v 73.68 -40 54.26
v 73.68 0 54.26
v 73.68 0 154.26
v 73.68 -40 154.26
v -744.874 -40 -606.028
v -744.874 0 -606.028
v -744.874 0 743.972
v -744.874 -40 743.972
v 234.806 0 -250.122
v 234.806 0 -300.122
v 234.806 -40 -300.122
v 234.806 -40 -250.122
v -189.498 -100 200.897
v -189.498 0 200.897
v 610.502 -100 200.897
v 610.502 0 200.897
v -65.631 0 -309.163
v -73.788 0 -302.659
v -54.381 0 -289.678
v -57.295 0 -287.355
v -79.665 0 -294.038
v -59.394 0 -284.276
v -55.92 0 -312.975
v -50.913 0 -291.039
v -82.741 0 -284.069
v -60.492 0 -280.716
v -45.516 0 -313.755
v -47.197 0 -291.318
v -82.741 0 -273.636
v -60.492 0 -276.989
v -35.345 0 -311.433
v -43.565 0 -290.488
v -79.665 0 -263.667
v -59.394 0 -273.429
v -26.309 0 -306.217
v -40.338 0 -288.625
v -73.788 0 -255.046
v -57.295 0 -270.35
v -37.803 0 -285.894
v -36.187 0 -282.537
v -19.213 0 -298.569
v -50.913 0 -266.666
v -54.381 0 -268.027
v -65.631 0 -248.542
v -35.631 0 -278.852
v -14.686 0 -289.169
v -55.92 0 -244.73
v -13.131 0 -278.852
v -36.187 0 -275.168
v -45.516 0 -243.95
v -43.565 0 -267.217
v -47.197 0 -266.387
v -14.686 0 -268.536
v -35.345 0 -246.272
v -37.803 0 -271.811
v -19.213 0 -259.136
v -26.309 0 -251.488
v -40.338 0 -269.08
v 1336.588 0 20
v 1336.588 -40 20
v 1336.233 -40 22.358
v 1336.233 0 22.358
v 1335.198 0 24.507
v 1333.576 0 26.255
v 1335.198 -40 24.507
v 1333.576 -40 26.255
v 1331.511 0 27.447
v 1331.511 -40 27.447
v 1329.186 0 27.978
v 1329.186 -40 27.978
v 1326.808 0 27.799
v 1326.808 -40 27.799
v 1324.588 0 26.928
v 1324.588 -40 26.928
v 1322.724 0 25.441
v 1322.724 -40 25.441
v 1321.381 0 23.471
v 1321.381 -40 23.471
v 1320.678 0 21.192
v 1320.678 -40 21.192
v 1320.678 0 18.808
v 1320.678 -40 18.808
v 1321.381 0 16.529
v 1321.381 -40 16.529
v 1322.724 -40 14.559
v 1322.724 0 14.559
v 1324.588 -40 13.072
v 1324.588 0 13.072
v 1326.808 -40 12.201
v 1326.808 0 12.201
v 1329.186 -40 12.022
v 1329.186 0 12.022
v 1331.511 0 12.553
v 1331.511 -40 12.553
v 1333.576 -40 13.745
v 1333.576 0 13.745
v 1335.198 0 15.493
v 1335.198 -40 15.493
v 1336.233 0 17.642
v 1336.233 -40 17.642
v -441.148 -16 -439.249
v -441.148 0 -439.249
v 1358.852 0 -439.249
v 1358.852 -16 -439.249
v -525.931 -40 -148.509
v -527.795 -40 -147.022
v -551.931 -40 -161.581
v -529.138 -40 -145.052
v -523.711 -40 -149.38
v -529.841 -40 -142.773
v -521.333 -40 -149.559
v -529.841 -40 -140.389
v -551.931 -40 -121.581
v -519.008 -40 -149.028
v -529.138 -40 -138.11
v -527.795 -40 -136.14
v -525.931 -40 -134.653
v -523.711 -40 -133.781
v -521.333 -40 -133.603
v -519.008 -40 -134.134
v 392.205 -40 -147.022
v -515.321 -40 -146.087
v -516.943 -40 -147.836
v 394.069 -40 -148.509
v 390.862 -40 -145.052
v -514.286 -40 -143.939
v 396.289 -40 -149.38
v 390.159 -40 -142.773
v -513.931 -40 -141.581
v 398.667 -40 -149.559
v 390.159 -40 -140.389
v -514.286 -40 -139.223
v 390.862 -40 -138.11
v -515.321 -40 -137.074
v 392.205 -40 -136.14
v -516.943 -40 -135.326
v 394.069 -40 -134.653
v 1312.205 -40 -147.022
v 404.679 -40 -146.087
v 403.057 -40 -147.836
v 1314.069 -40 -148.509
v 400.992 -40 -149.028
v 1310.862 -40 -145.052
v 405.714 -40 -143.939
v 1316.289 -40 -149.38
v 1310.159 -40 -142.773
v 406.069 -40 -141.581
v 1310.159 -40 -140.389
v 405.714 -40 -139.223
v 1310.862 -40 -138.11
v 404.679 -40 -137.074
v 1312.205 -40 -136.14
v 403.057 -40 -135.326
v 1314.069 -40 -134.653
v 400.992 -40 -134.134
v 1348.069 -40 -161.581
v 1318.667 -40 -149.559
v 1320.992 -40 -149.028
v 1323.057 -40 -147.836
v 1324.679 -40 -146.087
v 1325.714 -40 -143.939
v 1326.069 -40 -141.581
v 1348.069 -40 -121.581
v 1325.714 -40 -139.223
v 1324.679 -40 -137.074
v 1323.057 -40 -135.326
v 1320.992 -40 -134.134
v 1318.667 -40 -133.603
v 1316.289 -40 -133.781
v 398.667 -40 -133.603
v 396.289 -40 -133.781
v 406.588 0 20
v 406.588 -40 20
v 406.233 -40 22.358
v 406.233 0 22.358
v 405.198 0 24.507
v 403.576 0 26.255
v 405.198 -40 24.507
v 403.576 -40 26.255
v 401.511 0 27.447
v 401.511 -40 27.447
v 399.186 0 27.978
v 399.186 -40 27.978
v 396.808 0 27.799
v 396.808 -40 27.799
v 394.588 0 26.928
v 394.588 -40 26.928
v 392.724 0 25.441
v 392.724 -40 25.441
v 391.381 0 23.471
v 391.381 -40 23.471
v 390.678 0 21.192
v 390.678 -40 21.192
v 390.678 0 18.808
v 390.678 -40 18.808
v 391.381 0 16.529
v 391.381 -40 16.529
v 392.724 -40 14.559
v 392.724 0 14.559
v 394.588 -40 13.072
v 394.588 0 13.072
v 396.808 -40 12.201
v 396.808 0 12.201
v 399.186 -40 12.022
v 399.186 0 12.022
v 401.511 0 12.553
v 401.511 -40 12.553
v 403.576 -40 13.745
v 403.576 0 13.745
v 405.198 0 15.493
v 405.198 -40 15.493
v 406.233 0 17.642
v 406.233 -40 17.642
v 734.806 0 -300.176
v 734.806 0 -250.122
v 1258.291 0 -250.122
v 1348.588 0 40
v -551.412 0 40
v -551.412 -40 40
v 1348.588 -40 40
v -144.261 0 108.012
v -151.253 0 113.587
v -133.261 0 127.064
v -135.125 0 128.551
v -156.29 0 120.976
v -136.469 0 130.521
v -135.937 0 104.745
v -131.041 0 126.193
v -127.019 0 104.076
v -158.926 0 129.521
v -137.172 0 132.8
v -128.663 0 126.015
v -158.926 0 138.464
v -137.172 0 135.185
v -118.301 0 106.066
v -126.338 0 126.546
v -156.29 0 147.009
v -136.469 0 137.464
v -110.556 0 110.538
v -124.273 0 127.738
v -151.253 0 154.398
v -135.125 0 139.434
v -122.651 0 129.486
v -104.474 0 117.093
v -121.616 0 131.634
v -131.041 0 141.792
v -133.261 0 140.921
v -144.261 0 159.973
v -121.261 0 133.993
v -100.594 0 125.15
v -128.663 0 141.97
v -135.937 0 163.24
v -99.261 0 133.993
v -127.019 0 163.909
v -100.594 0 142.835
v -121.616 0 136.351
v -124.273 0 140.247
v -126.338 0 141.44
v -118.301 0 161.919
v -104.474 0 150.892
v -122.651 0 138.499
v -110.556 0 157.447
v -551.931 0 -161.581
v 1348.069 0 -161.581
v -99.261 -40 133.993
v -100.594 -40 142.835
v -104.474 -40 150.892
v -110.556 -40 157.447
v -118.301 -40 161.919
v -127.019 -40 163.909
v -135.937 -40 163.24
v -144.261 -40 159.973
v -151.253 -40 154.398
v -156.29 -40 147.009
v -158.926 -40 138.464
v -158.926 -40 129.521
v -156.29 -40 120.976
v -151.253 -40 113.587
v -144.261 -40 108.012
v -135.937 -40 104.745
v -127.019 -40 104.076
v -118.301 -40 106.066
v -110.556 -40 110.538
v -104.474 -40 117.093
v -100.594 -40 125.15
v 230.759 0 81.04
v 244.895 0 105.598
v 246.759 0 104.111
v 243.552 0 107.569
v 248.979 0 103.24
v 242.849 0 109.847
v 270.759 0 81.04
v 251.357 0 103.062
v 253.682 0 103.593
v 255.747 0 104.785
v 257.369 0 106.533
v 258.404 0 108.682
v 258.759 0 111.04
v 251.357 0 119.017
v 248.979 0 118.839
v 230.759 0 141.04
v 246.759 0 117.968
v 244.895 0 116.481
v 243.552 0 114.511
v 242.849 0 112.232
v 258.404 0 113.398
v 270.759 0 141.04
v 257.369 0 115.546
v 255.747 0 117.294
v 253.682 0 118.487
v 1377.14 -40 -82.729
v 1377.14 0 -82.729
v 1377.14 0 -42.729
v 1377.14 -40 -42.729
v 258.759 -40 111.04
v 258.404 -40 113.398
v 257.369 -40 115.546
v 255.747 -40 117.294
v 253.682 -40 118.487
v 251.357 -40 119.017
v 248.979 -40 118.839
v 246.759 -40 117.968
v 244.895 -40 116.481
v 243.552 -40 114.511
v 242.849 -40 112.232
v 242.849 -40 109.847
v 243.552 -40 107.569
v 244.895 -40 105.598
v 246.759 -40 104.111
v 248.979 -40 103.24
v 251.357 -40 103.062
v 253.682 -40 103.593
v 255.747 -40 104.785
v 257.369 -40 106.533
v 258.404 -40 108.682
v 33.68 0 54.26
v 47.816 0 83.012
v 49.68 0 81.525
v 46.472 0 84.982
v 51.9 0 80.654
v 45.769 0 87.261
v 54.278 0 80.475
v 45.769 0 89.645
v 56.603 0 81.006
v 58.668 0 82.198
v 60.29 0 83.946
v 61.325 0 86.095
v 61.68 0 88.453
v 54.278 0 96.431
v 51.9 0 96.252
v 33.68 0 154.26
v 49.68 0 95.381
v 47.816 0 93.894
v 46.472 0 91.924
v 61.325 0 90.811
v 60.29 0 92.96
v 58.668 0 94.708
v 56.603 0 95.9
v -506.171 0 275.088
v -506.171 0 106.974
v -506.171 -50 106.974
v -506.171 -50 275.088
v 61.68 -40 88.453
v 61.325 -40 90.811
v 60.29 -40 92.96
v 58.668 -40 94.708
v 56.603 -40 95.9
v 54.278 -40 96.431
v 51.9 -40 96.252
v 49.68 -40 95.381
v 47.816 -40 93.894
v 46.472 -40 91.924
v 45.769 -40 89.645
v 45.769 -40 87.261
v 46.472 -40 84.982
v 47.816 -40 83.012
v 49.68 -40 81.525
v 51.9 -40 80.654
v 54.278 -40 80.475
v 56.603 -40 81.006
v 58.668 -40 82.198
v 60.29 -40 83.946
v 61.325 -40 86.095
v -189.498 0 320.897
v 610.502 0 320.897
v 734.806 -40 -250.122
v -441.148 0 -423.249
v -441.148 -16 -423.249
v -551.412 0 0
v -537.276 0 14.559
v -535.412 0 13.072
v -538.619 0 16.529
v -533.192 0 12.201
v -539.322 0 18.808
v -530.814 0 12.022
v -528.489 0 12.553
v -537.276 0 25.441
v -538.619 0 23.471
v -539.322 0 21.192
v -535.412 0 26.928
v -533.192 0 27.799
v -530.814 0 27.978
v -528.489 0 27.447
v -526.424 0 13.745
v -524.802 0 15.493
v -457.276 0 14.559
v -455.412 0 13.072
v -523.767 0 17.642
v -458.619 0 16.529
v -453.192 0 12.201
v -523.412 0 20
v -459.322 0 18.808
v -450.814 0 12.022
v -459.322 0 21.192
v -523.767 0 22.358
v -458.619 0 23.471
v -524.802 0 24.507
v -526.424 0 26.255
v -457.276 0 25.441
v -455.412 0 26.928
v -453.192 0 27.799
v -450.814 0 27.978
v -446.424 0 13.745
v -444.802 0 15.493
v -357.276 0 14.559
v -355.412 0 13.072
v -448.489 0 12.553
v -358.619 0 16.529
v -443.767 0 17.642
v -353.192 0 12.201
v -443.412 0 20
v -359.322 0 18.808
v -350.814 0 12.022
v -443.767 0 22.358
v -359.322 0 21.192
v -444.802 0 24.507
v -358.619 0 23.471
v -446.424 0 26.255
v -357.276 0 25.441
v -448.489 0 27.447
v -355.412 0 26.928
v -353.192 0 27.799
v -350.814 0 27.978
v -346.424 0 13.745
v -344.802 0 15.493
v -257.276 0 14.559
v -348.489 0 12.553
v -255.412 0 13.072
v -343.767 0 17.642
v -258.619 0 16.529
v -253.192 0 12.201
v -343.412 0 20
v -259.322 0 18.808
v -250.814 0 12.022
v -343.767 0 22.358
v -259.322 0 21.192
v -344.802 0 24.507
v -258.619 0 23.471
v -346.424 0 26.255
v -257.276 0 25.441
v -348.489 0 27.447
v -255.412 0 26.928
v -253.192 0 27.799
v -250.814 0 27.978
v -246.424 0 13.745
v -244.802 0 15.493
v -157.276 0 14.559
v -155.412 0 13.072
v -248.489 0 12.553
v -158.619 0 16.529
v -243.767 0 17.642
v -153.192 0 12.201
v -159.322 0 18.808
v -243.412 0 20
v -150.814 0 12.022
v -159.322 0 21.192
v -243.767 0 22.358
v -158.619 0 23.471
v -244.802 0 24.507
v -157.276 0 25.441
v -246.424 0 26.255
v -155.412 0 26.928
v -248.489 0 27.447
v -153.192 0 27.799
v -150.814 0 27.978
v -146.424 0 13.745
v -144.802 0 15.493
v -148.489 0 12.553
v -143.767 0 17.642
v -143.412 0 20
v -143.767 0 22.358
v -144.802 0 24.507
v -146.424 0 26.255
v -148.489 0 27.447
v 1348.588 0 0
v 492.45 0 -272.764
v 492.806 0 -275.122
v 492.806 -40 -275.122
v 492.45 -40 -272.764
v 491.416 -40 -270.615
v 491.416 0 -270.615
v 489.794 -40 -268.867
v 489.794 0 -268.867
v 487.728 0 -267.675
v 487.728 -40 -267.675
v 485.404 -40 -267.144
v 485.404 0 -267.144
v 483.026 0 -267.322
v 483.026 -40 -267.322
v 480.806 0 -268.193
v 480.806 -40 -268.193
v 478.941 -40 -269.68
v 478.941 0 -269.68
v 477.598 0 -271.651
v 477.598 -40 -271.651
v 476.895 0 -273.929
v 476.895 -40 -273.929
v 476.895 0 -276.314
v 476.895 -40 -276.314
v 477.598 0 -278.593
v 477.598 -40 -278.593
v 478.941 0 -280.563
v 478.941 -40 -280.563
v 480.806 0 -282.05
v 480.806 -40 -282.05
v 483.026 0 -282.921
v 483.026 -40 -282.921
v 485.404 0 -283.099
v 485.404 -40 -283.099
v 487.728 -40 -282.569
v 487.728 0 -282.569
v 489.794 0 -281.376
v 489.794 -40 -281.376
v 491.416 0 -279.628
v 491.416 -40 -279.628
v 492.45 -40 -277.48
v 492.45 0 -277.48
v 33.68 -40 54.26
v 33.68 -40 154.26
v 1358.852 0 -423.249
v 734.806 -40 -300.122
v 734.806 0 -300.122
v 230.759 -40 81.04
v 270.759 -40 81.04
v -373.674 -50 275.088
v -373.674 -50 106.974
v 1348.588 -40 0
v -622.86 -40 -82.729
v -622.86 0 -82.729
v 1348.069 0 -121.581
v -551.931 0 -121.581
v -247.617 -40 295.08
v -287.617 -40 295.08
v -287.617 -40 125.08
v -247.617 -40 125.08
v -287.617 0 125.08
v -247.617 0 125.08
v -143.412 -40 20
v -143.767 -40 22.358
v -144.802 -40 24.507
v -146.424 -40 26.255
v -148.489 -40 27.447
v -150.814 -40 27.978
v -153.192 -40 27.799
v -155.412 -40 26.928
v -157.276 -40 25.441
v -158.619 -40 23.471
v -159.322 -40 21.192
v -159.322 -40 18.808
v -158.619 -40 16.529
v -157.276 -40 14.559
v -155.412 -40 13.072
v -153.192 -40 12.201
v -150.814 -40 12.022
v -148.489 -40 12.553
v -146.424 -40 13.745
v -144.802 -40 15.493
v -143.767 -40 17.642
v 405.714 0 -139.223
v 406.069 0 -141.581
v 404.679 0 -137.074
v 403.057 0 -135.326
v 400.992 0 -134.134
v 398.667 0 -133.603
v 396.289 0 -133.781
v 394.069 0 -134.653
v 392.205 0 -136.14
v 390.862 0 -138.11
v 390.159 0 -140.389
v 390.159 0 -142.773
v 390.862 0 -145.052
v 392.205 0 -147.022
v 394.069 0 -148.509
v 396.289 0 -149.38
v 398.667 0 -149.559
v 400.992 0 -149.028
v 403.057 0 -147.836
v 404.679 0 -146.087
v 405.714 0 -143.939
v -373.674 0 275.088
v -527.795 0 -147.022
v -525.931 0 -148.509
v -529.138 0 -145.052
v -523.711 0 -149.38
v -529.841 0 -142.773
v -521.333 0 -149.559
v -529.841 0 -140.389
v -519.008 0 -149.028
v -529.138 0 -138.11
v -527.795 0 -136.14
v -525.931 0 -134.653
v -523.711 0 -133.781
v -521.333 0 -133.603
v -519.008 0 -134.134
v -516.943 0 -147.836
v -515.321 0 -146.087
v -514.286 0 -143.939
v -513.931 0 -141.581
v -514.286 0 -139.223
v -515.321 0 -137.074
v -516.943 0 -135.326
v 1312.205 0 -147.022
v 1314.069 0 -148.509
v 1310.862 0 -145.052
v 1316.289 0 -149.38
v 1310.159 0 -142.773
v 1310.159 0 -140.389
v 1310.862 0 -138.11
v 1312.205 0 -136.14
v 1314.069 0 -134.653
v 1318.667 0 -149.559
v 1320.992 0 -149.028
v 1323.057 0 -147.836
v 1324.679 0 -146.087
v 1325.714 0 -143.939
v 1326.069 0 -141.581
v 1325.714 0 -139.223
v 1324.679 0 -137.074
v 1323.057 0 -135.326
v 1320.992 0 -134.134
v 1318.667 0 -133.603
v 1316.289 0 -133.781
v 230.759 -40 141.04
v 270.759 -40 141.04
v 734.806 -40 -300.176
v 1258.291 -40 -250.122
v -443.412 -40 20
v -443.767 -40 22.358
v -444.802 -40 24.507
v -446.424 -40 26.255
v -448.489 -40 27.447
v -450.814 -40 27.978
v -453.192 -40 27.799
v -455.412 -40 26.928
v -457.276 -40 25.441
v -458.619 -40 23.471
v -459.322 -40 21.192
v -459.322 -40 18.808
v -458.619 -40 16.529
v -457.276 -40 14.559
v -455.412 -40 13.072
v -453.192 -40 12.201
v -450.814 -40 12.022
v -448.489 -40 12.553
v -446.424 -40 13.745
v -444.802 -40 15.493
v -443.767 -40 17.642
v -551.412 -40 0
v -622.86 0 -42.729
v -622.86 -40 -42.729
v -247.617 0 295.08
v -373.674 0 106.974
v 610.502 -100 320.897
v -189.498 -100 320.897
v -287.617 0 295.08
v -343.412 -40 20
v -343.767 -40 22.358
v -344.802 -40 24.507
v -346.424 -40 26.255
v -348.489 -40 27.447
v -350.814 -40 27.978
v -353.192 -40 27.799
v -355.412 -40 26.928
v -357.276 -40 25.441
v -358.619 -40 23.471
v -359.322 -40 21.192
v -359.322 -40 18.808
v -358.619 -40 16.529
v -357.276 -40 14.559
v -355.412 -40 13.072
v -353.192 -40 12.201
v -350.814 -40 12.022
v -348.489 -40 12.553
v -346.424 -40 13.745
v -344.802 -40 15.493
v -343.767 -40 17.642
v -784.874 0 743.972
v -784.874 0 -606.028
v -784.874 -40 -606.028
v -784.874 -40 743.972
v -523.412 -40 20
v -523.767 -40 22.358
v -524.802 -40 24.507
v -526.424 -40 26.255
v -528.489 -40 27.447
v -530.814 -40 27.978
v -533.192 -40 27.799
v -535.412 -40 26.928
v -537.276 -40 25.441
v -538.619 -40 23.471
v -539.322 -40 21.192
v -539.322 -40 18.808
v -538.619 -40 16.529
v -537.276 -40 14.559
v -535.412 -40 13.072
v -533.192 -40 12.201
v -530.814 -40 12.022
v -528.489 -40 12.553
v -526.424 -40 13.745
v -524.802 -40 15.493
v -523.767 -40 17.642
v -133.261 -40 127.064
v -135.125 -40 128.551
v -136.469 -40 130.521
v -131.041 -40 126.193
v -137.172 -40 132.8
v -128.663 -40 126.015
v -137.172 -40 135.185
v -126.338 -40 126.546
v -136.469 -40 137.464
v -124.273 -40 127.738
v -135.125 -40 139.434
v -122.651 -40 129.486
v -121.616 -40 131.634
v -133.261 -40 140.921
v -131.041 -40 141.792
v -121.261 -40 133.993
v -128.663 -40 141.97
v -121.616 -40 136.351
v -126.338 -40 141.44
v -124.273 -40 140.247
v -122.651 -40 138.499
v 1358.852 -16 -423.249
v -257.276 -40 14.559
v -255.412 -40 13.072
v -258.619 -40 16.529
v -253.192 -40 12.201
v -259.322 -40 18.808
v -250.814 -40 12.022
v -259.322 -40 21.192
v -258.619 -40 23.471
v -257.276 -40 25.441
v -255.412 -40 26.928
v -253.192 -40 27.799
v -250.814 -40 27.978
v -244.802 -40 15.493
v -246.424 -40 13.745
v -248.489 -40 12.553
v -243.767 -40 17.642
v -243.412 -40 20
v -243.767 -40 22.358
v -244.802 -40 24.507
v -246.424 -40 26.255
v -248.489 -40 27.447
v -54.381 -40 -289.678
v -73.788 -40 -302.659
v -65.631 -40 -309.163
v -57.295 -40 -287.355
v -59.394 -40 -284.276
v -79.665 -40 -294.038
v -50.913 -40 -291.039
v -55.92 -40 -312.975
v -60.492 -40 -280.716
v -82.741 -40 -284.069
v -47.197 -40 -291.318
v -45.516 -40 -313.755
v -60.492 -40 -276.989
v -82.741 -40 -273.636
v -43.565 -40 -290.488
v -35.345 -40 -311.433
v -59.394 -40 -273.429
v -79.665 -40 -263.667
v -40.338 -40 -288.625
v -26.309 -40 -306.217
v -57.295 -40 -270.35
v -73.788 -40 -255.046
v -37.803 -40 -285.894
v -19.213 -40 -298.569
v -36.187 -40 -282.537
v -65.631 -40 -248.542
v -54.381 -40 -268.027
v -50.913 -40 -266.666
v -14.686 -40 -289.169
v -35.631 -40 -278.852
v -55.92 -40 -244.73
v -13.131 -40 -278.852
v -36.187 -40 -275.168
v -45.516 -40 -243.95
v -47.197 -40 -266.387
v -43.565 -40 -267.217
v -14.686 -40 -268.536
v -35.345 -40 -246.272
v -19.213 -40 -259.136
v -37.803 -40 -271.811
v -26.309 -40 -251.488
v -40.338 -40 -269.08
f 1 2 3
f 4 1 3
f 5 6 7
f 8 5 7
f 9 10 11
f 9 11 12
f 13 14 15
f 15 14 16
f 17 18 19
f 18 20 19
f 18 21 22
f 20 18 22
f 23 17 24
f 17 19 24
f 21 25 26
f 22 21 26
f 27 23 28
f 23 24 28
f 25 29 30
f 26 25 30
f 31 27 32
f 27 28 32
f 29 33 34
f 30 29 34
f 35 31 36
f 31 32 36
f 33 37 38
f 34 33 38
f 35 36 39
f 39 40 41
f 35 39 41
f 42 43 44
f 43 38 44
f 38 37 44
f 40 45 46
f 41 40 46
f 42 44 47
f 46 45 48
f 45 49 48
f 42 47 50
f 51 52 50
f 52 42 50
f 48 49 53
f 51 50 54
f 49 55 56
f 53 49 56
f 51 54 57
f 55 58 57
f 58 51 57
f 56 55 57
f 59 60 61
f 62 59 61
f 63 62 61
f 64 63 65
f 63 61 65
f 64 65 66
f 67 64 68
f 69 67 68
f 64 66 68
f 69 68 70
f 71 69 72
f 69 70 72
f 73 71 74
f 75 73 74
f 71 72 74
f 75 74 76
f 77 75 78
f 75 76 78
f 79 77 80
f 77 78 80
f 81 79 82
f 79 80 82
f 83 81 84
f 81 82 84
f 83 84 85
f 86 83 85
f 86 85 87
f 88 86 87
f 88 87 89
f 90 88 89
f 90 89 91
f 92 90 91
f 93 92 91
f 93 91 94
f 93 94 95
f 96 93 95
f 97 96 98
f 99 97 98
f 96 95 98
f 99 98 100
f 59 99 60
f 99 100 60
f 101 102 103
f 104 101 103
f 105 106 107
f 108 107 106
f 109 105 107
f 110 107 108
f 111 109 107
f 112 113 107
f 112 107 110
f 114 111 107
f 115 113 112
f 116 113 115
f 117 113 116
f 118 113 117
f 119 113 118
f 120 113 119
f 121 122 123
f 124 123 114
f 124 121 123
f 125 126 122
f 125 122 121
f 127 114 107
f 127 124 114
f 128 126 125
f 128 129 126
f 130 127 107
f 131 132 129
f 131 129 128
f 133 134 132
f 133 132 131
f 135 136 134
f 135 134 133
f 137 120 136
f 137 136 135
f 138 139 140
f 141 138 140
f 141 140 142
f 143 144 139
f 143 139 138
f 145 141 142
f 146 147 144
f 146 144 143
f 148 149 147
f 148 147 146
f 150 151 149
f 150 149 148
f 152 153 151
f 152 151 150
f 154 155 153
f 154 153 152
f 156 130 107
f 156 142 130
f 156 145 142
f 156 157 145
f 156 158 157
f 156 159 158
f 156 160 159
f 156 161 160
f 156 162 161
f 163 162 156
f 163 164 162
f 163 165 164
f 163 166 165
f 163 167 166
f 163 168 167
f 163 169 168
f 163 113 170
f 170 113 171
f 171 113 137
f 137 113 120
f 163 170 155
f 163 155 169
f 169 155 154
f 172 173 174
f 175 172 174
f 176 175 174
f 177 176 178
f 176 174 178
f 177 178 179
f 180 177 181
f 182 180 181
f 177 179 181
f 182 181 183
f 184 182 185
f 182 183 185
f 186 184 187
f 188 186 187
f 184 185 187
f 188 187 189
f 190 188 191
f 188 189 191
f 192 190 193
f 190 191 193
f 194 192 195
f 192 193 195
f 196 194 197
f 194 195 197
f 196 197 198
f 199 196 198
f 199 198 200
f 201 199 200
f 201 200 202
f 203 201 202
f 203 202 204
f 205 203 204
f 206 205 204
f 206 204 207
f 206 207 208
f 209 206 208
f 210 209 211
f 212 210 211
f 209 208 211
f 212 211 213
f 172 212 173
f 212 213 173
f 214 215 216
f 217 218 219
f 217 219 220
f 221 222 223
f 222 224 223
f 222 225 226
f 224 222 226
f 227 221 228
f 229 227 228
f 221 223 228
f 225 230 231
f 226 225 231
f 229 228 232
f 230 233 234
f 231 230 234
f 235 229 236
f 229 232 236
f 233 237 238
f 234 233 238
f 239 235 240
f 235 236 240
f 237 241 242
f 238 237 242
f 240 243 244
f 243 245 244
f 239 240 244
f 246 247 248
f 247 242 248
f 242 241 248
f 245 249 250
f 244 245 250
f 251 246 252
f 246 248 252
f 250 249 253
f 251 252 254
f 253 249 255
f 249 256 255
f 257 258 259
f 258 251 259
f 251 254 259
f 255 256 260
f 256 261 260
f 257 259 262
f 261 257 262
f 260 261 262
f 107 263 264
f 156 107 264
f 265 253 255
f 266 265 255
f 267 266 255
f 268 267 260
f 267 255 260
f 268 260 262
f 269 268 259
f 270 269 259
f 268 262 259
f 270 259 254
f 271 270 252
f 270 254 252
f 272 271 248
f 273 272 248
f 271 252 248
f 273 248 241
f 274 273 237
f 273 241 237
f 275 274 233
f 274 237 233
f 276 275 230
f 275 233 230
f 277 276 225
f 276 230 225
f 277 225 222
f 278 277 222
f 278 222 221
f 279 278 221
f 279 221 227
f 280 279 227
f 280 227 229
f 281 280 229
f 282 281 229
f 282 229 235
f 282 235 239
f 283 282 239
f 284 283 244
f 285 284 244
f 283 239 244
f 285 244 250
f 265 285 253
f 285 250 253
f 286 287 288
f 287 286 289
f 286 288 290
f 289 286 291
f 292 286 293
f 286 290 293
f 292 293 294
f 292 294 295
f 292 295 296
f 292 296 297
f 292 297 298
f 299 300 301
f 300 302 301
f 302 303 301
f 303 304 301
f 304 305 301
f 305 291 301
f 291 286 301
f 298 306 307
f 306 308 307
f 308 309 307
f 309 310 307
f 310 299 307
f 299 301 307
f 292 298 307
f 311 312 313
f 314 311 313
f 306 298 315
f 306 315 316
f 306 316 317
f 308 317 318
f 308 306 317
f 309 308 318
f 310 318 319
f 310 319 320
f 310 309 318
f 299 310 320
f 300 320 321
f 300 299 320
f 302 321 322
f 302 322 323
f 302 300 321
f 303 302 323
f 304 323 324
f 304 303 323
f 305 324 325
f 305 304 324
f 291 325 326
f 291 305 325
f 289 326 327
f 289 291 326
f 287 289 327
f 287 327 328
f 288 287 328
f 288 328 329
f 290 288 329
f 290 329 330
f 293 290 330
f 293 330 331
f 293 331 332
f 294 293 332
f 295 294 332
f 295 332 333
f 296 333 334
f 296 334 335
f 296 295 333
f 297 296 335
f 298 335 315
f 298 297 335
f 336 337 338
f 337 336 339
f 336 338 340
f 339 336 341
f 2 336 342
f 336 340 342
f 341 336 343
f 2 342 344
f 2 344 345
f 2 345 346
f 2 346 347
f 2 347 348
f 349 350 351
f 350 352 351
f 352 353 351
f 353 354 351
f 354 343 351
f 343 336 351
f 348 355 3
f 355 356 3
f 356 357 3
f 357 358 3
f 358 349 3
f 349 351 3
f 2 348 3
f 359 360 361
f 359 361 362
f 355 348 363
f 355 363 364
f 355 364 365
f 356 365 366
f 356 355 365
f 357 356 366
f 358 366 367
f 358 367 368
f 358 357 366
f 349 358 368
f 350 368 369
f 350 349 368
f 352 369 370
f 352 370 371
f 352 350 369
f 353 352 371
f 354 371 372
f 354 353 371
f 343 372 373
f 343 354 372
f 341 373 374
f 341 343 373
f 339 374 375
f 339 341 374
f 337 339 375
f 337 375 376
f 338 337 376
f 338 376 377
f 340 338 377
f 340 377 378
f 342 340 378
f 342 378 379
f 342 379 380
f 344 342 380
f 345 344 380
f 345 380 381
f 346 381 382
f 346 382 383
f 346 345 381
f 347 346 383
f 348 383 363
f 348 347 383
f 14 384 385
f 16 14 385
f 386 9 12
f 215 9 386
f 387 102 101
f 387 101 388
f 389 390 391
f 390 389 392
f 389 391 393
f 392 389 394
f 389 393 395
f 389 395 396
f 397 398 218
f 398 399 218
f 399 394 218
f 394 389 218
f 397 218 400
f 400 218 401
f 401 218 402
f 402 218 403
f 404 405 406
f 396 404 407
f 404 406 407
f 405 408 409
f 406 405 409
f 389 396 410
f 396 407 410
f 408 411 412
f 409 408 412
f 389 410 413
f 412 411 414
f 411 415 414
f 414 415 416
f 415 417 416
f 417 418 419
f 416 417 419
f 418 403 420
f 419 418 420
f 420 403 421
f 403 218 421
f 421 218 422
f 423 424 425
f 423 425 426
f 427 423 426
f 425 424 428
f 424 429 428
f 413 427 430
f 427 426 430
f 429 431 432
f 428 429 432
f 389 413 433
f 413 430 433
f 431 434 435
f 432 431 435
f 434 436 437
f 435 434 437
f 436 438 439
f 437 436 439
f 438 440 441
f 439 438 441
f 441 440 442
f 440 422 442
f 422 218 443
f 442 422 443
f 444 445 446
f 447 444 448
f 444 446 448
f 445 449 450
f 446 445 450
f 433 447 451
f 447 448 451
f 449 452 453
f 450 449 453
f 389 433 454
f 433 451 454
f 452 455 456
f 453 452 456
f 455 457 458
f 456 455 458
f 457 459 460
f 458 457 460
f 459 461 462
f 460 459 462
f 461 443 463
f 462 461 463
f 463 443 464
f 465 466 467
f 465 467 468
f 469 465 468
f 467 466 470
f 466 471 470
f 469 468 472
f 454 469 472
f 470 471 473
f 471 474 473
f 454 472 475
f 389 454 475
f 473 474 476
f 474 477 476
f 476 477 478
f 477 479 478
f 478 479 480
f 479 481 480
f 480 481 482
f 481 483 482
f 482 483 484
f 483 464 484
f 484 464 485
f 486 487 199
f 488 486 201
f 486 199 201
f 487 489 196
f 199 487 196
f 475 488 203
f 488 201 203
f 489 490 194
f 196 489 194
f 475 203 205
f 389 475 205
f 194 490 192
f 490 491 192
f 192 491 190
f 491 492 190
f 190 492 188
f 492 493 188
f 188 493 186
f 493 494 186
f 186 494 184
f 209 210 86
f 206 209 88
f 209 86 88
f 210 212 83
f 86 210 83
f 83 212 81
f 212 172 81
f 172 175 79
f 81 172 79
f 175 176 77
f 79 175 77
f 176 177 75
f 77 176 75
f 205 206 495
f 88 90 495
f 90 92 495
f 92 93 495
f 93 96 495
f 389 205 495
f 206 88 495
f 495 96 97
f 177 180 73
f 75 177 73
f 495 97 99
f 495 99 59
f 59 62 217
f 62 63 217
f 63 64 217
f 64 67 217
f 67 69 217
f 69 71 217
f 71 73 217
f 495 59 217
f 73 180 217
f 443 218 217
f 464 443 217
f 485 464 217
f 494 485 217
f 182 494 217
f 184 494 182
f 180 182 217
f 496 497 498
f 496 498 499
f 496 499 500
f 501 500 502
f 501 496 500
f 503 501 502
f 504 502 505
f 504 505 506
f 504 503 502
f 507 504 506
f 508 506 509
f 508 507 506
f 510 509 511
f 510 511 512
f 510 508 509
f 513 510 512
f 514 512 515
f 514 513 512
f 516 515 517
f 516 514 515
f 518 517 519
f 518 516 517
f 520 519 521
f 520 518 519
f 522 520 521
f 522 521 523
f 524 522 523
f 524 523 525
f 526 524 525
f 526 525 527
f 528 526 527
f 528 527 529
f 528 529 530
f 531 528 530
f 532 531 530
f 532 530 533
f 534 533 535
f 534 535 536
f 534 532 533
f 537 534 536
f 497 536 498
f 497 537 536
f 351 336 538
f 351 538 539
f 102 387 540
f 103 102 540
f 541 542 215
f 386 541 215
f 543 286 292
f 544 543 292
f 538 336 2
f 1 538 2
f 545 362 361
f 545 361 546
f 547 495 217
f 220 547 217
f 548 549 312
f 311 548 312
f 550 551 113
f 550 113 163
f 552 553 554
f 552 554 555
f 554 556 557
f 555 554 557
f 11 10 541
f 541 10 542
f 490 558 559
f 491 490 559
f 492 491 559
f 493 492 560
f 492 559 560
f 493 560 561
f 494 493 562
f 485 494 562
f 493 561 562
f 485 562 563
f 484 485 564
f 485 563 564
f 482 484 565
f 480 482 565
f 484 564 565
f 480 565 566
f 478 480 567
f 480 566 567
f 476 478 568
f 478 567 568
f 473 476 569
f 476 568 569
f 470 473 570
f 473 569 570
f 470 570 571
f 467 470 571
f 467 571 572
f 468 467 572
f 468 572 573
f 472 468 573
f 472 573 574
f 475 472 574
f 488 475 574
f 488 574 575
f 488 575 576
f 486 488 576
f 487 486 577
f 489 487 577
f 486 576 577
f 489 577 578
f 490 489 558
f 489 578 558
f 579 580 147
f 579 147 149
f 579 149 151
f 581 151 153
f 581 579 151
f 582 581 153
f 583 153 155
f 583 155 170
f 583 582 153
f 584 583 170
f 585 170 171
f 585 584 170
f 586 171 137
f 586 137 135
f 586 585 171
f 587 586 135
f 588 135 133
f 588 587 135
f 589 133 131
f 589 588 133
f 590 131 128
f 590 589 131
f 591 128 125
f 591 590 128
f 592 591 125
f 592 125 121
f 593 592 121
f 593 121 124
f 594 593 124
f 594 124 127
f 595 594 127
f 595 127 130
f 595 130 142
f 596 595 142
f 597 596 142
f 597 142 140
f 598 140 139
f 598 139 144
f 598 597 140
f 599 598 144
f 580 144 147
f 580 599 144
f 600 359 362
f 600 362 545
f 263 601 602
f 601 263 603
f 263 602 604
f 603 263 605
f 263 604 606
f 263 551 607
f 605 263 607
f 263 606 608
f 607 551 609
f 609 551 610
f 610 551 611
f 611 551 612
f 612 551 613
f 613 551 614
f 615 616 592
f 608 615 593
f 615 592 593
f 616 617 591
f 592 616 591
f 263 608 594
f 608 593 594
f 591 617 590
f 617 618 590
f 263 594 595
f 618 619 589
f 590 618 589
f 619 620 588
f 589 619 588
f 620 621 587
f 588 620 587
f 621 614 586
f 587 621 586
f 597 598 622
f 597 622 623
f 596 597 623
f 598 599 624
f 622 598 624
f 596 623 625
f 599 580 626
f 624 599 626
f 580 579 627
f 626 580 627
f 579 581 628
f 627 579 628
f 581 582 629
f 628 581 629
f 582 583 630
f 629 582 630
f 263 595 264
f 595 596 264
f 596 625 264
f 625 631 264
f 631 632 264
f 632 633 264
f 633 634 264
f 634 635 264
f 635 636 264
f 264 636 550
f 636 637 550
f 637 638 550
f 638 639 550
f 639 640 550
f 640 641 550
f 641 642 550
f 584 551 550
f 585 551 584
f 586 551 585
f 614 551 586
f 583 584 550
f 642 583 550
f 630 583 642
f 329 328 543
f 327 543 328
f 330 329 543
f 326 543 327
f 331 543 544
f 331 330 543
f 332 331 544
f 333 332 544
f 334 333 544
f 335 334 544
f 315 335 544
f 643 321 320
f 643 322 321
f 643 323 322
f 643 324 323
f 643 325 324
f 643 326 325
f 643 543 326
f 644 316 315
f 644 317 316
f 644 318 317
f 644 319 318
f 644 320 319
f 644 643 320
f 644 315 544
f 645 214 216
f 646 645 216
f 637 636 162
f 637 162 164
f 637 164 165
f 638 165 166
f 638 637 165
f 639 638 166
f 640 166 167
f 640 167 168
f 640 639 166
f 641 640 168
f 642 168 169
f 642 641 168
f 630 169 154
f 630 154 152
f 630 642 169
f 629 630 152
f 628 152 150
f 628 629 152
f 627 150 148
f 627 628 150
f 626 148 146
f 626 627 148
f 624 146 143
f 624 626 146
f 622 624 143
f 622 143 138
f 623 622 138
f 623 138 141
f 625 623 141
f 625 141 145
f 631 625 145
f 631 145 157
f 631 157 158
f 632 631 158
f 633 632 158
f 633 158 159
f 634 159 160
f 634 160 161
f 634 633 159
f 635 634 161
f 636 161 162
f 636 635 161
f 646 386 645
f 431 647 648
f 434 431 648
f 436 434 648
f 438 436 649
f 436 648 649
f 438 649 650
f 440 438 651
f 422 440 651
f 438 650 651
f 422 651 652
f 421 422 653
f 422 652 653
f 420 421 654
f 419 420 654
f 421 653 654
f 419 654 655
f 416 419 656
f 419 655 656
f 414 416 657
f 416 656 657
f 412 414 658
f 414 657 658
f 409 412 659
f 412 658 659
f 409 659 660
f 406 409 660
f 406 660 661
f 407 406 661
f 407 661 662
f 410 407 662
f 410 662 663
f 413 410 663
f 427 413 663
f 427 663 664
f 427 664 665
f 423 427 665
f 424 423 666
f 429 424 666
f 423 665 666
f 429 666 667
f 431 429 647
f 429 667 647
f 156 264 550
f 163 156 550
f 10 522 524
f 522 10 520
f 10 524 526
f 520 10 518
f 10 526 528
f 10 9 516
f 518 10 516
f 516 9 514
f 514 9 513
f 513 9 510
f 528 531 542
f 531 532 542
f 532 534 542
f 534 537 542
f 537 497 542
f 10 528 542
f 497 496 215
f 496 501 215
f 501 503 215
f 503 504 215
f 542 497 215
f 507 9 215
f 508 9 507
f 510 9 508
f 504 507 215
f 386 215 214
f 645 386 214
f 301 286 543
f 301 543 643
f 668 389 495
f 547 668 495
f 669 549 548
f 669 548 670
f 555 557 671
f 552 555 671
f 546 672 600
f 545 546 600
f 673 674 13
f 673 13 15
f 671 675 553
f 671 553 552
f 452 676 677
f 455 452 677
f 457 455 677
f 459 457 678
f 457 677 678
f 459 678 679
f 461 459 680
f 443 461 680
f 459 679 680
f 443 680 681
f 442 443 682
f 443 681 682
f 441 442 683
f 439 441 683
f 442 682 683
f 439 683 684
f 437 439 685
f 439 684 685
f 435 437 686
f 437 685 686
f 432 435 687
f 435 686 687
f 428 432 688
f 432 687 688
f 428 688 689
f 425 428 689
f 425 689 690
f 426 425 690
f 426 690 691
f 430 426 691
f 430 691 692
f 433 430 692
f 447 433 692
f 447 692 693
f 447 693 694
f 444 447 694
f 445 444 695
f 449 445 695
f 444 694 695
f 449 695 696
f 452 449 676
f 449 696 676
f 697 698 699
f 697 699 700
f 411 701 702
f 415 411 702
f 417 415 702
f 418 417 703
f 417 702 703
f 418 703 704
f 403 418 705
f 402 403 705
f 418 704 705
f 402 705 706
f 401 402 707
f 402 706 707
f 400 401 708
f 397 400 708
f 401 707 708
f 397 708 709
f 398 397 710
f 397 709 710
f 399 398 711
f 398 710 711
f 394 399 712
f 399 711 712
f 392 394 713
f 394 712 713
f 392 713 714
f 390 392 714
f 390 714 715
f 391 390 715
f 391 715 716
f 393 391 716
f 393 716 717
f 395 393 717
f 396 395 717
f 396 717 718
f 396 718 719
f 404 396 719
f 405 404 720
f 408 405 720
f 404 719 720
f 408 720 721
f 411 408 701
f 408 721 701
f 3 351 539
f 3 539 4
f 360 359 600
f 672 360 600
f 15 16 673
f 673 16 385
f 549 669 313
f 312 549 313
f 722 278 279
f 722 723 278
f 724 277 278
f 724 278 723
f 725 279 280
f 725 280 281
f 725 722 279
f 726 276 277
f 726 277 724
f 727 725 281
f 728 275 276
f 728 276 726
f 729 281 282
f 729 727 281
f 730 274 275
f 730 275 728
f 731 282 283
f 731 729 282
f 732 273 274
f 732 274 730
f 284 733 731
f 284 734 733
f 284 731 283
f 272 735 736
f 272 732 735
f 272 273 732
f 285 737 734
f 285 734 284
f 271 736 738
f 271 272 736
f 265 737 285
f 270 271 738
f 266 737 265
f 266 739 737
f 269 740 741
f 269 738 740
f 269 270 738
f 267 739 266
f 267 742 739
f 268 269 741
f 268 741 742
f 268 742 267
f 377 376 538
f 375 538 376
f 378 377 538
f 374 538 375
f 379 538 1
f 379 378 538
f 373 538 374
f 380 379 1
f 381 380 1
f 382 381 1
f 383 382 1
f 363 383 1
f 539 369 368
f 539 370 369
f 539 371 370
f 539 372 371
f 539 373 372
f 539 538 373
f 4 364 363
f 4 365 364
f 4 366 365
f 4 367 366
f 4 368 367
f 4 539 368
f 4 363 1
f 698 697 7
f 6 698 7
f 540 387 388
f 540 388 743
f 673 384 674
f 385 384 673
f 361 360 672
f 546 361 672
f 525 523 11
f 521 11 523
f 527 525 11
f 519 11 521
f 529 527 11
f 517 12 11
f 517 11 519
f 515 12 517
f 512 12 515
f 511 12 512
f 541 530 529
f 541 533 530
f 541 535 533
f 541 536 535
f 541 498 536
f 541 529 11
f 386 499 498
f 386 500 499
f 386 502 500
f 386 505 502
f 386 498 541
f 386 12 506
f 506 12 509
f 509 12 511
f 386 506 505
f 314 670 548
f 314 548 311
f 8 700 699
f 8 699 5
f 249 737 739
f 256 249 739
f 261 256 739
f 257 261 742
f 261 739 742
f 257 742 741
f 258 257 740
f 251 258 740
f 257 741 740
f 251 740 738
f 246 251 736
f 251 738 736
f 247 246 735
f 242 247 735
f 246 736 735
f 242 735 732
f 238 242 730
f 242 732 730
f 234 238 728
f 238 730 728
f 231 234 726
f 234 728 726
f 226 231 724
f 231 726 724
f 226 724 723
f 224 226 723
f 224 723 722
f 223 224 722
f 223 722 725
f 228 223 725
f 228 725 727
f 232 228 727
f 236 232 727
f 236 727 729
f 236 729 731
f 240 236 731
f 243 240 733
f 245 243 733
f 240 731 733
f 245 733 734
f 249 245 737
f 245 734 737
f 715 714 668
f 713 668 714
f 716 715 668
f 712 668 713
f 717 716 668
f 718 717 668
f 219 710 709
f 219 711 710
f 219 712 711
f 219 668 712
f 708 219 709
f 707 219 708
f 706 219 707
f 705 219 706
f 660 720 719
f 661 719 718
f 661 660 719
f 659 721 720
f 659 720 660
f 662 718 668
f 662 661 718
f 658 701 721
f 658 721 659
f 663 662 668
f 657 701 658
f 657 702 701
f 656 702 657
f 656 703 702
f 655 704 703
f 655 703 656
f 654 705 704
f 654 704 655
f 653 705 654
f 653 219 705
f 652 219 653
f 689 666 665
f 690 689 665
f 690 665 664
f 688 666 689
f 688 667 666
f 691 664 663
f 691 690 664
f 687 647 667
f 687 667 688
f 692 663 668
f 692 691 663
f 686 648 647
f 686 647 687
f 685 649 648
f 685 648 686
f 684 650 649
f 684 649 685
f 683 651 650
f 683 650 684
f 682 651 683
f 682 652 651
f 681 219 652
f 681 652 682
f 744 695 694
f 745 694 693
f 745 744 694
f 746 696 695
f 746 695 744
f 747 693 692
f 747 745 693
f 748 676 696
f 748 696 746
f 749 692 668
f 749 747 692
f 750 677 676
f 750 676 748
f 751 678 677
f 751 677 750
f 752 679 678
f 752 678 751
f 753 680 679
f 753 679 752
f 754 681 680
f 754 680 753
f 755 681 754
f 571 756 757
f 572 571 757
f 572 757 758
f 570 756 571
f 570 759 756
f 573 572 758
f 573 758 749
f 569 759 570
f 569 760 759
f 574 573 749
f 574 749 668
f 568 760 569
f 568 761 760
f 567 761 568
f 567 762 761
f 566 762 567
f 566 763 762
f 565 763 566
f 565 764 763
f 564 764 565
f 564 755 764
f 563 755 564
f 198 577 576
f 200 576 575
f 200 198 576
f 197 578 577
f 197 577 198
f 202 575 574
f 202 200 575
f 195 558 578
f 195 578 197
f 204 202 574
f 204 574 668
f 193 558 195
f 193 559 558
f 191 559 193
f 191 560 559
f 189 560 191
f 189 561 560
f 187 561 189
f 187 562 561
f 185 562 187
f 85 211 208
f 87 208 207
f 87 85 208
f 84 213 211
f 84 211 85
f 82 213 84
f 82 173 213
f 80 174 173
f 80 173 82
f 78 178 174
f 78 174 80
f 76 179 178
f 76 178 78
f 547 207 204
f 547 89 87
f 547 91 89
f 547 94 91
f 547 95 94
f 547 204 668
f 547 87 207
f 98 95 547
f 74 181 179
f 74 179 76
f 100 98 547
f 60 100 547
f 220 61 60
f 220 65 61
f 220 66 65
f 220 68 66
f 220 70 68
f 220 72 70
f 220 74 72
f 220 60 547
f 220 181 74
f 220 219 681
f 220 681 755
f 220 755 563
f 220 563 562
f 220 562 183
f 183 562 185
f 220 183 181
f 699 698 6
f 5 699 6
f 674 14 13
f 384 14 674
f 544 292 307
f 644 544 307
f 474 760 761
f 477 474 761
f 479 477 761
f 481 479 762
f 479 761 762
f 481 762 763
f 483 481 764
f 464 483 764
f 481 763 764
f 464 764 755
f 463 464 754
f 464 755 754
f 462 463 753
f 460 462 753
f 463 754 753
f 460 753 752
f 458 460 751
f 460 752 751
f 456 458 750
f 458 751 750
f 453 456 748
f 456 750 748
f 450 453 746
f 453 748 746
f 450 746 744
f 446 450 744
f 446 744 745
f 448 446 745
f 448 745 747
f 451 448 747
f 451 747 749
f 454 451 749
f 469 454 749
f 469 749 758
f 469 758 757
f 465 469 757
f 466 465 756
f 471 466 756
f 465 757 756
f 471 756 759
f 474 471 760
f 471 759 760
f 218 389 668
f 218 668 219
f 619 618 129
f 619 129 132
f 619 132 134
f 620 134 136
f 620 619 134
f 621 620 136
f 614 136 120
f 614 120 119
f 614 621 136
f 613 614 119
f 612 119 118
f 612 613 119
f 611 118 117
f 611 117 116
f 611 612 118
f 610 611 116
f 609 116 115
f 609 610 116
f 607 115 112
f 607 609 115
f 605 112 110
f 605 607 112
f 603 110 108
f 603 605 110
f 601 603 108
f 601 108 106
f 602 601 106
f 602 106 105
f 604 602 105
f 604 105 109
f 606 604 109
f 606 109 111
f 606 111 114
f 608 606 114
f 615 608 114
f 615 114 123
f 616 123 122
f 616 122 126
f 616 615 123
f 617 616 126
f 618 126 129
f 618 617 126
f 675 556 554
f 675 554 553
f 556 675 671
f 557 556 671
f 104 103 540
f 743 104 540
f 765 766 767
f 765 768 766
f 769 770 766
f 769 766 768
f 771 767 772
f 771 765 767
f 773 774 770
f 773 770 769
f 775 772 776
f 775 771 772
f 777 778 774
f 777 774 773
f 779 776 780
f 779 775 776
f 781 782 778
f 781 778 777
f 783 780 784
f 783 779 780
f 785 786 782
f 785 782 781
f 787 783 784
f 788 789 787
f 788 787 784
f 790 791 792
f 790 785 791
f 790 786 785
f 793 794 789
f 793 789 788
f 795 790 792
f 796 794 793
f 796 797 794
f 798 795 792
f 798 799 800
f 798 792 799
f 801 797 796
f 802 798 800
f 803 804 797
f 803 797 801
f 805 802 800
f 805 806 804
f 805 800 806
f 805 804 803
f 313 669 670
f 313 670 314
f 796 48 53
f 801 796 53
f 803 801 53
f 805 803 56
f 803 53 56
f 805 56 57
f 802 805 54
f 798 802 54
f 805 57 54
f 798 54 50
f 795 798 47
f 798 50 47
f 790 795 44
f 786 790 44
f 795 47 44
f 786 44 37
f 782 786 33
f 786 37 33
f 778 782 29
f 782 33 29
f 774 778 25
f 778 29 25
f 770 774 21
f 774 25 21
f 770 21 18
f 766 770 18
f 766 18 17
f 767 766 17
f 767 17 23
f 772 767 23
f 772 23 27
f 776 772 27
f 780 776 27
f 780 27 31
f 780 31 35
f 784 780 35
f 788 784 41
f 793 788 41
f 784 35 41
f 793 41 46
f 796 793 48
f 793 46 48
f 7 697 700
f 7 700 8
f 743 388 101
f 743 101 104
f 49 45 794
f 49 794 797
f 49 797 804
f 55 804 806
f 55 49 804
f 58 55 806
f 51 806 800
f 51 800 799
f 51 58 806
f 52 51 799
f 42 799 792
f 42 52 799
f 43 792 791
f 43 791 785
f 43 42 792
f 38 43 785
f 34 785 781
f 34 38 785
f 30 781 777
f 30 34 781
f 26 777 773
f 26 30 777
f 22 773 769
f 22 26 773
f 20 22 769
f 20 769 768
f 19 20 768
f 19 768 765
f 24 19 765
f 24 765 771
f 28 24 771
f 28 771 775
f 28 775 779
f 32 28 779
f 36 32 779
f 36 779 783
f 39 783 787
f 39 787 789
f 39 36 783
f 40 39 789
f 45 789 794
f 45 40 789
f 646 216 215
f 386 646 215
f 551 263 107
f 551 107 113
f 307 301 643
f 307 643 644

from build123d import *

# Parameters (mm, degrees)
F0_W      = 1900
F0_H      = 40
F1_DEPTH  = 40
F2_R      = 8
F3_DEPTH  = 40
F4_R      = 8
F5_DEPTH  = 40
F6_R      = 8
F7_DEPTH  = 40
F8_R      = 30
F9_DEPTH  = 40
F10_R     = 8
F11_DEPTH = 40
F12_W     = 40
F12_H     = 60
F12_R     = 8
F13_DEPTH = 40
F14_W     = 2000
F14_H     = 40
F15_DEPTH = 40
F16_W     = 800
F16_H     = 120
F17_DEPTH = 100
F18_R     = 8
F19_DEPTH = 40
F20_R     = 8
F21_DEPTH = 40
F22_W     = 40
F22_H     = 100
F22_R     = 8
F23_DEPTH = 40
F24_W     = 132.4965953827
F24_H     = 168.1139841676
F25_DEPTH = 50
F26_R     = 8
F27_DEPTH = 40
F28_R     = 8
F29_DEPTH = 40
F30_R     = 8
F31_DEPTH = 40
F32_W     = 1900
F32_H     = 40
F32_R     = 8
F33_DEPTH = 40
F34_W     = 40
F34_H     = 170
F35_DEPTH = 40
F36_W     = 500
F36_H     = 50
F36_R     = 8
F38_DEPTH = 40
F39_R     = 35
F39_R_2   = 12.5
F40_DEPTH = 40
F41_W     = 40
F41_H     = 1350
F42_DEPTH = 40
F43_W     = 1800
F43_H     = 16
F44_DEPTH = 16


with BuildPart() as f1:
    # F0 (on Front) → F1 (new body)
    with BuildSketch(Plane.XZ):
        with Locations((398.5883434173, 20)):
            Rectangle(F0_W, F0_H)
    extrude(amount=F1_DEPTH)

    # F2 (on face) → F3 (cut)
    with BuildSketch(Plane.XZ.offset(40)):
        with Locations((-531.4116565827, 20)):
            Circle(F2_R)
    extrude(amount=-F3_DEPTH, mode=Mode.SUBTRACT)

    # F4 (on face) → F5 (cut)
    with BuildSketch(Plane.XZ.offset(40)):
        with Locations((398.5883434173, 20)):
            Circle(F4_R)
    extrude(amount=-F5_DEPTH, mode=Mode.SUBTRACT)

    # F6 (on face) → F7 (cut)
    with BuildSketch(Plane.XZ.offset(40)):
        with Locations((1328.5883434173, 20)):
            Circle(F6_R)
    extrude(amount=-F7_DEPTH, mode=Mode.SUBTRACT)

    # F18 (on face) → F19 (cut)
    with BuildSketch(Plane.XZ.offset(40)):
        with Locations((-451.4116565827, 20)):
            Circle(F18_R)
    extrude(amount=-F19_DEPTH, mode=Mode.SUBTRACT)

    # F20 (on face) → F21 (cut)
    with BuildSketch(Plane.XZ.offset(40)):
        with Locations((-351.4116565827, 20)):
            Circle(F20_R)
    extrude(amount=-F21_DEPTH, mode=Mode.SUBTRACT)

    # F26 (on face) → F27 (cut)
    with BuildSketch(Plane.XZ.offset(40)):
        with Locations((-264.6850347519, 20)):
            Circle(F26_R)
    extrude(amount=F27_DEPTH, mode=Mode.SUBTRACT)

    # F28 (on face) → F29 (cut)
    with BuildSketch(Plane.XZ.offset(40)):
        with Locations((-251.4116565827, 20)):
            Circle(F28_R)
    extrude(amount=-F29_DEPTH, mode=Mode.SUBTRACT)

    # F30 (on face) → F31 (cut)
    with BuildSketch(Plane.XZ.offset(40)):
        with Locations((-151.4116565827, 20)):
            Circle(F30_R)
    extrude(amount=-F31_DEPTH, mode=Mode.SUBTRACT)


with BuildPart() as f9:
    # F8 (on Front) → F9 (new body)
    with BuildSketch(Plane.XZ):
        with Locations((-129.2610317469, 133.9925378561)):
            Circle(F8_R)
    extrude(amount=F9_DEPTH)

    # F10 (on face) → F11 (cut)
    with BuildSketch(Plane.XZ.offset(40)):
        with Locations((-129.2610317469, 133.9925378561)):
            Circle(F10_R)
    extrude(amount=-F11_DEPTH, mode=Mode.SUBTRACT)


with BuildPart() as f13:
    # F12 (on Front) → F13 (new body)
    with BuildSketch(Plane.XZ):
        with Locations((250.7593226433, 111.0396894813)):
            Rectangle(F12_W, F12_H)
        with Locations((250.7593226433, 111.0396894813)):
            Circle(F12_R, mode=Mode.SUBTRACT)
    extrude(amount=F13_DEPTH)


with BuildPart() as f15:
    # F14 (on Front) → F15 (new body)
    with BuildSketch(Plane.XZ):
        with Locations((377.1399259567, -62.7289745212)):
            Rectangle(F14_W, F14_H)
    extrude(amount=F15_DEPTH)


with BuildPart() as f17:
    # F16 (on Front) → F17 (new body)
    with BuildSketch(Plane.XZ):
        with Locations((210.5024814606, 260.8968889713)):
            Rectangle(F16_W, F16_H)
    extrude(amount=F17_DEPTH)


with BuildPart() as f23:
    # F22 (on Front) → F23 (new body)
    with BuildSketch(Plane.XZ):
        with Locations((53.679946363, 104.2603507638)):
            Rectangle(F22_W, F22_H)
        with Locations((53.679946363, 88.4530246258)):
            Circle(F22_R, mode=Mode.SUBTRACT)
    extrude(amount=F23_DEPTH)


with BuildPart() as f25:
    # F24 (on Front) → F25 (new body)
    with BuildSketch(Plane.XZ):
        with Locations((-439.9225115776, 191.031049937)):
            Rectangle(F24_W, F24_H)
    extrude(amount=F25_DEPTH)


with BuildPart() as f33:
    # F32 (on Front) → F33 (new body)
    with BuildSketch(Plane.XZ):
        with Locations((398.0693101883, -141.5809053183)):
            Rectangle(F32_W, F32_H)
        with Locations((-521.9306898117, -141.5809053183)):
            Circle(F32_R, mode=Mode.SUBTRACT)
        with Locations((398.0693101883, -141.5809053183)):
            Circle(F32_R, mode=Mode.SUBTRACT)
        with Locations((1318.0693101883, -141.5809053183)):
            Circle(F32_R, mode=Mode.SUBTRACT)
    extrude(amount=F33_DEPTH)


with BuildPart() as f35:
    # F34 (on Front) → F35 (new body)
    with BuildSketch(Plane.XZ):
        with Locations((-267.6166635752, 210.0803917646)):
            Rectangle(F34_W, F34_H)
    extrude(amount=F35_DEPTH)


with BuildPart() as f38:
    # F36 (on Front) → F38 (new body)
    with BuildSketch(Plane.XZ):
        with Locations((484.8057031631, -275.1216053963)):
            Rectangle(F36_W, F36_H)
        with Locations((484.8057031631, -275.1216053963)):
            Circle(F36_R, mode=Mode.SUBTRACT)
    extrude(amount=F38_DEPTH)


with BuildPart() as f38b:
    # F37 (on face) → F38, piece 2 (new body)
    with BuildSketch(Plane.XZ):
        Polygon((1258.2906484604, -250.1216053963), (734.8057031631, -250.1216053963), (734.8057031631, -300.1216053963), (734.8057031631, -300.1758158207), align=None)
    extrude(amount=F38_DEPTH)


with BuildPart() as f40:
    # F39 (on Front) → F40 (new body)
    with BuildSketch(Plane.XZ):
        with Locations((-48.1314398348, -278.8524925709)):
            Circle(F39_R)
        with Locations((-48.1314398348, -278.8524925709)):
            Circle(F39_R_2, mode=Mode.SUBTRACT)
    extrude(amount=F40_DEPTH)


with BuildPart() as f42:
    # F41 (on Front) → F42 (new body)
    with BuildSketch(Plane.XZ):
        with Locations((-764.8739409447, 68.9723968506)):
            Rectangle(F41_W, F41_H)
    extrude(amount=F42_DEPTH)


with BuildPart() as f44:
    # F43 (on Front) → F44 (new body)
    with BuildSketch(Plane.XZ):
        with Locations((458.852148056, -431.2492473125)):
            Rectangle(F43_W, F43_H)
    extrude(amount=F44_DEPTH)


solid = Compound([f1.part, f9.part, f13.part, f15.part, f17.part, f23.part, f25.part, f33.part, f35.part, f38.part, f38b.part, f40.part, f42.part, f44.part])
